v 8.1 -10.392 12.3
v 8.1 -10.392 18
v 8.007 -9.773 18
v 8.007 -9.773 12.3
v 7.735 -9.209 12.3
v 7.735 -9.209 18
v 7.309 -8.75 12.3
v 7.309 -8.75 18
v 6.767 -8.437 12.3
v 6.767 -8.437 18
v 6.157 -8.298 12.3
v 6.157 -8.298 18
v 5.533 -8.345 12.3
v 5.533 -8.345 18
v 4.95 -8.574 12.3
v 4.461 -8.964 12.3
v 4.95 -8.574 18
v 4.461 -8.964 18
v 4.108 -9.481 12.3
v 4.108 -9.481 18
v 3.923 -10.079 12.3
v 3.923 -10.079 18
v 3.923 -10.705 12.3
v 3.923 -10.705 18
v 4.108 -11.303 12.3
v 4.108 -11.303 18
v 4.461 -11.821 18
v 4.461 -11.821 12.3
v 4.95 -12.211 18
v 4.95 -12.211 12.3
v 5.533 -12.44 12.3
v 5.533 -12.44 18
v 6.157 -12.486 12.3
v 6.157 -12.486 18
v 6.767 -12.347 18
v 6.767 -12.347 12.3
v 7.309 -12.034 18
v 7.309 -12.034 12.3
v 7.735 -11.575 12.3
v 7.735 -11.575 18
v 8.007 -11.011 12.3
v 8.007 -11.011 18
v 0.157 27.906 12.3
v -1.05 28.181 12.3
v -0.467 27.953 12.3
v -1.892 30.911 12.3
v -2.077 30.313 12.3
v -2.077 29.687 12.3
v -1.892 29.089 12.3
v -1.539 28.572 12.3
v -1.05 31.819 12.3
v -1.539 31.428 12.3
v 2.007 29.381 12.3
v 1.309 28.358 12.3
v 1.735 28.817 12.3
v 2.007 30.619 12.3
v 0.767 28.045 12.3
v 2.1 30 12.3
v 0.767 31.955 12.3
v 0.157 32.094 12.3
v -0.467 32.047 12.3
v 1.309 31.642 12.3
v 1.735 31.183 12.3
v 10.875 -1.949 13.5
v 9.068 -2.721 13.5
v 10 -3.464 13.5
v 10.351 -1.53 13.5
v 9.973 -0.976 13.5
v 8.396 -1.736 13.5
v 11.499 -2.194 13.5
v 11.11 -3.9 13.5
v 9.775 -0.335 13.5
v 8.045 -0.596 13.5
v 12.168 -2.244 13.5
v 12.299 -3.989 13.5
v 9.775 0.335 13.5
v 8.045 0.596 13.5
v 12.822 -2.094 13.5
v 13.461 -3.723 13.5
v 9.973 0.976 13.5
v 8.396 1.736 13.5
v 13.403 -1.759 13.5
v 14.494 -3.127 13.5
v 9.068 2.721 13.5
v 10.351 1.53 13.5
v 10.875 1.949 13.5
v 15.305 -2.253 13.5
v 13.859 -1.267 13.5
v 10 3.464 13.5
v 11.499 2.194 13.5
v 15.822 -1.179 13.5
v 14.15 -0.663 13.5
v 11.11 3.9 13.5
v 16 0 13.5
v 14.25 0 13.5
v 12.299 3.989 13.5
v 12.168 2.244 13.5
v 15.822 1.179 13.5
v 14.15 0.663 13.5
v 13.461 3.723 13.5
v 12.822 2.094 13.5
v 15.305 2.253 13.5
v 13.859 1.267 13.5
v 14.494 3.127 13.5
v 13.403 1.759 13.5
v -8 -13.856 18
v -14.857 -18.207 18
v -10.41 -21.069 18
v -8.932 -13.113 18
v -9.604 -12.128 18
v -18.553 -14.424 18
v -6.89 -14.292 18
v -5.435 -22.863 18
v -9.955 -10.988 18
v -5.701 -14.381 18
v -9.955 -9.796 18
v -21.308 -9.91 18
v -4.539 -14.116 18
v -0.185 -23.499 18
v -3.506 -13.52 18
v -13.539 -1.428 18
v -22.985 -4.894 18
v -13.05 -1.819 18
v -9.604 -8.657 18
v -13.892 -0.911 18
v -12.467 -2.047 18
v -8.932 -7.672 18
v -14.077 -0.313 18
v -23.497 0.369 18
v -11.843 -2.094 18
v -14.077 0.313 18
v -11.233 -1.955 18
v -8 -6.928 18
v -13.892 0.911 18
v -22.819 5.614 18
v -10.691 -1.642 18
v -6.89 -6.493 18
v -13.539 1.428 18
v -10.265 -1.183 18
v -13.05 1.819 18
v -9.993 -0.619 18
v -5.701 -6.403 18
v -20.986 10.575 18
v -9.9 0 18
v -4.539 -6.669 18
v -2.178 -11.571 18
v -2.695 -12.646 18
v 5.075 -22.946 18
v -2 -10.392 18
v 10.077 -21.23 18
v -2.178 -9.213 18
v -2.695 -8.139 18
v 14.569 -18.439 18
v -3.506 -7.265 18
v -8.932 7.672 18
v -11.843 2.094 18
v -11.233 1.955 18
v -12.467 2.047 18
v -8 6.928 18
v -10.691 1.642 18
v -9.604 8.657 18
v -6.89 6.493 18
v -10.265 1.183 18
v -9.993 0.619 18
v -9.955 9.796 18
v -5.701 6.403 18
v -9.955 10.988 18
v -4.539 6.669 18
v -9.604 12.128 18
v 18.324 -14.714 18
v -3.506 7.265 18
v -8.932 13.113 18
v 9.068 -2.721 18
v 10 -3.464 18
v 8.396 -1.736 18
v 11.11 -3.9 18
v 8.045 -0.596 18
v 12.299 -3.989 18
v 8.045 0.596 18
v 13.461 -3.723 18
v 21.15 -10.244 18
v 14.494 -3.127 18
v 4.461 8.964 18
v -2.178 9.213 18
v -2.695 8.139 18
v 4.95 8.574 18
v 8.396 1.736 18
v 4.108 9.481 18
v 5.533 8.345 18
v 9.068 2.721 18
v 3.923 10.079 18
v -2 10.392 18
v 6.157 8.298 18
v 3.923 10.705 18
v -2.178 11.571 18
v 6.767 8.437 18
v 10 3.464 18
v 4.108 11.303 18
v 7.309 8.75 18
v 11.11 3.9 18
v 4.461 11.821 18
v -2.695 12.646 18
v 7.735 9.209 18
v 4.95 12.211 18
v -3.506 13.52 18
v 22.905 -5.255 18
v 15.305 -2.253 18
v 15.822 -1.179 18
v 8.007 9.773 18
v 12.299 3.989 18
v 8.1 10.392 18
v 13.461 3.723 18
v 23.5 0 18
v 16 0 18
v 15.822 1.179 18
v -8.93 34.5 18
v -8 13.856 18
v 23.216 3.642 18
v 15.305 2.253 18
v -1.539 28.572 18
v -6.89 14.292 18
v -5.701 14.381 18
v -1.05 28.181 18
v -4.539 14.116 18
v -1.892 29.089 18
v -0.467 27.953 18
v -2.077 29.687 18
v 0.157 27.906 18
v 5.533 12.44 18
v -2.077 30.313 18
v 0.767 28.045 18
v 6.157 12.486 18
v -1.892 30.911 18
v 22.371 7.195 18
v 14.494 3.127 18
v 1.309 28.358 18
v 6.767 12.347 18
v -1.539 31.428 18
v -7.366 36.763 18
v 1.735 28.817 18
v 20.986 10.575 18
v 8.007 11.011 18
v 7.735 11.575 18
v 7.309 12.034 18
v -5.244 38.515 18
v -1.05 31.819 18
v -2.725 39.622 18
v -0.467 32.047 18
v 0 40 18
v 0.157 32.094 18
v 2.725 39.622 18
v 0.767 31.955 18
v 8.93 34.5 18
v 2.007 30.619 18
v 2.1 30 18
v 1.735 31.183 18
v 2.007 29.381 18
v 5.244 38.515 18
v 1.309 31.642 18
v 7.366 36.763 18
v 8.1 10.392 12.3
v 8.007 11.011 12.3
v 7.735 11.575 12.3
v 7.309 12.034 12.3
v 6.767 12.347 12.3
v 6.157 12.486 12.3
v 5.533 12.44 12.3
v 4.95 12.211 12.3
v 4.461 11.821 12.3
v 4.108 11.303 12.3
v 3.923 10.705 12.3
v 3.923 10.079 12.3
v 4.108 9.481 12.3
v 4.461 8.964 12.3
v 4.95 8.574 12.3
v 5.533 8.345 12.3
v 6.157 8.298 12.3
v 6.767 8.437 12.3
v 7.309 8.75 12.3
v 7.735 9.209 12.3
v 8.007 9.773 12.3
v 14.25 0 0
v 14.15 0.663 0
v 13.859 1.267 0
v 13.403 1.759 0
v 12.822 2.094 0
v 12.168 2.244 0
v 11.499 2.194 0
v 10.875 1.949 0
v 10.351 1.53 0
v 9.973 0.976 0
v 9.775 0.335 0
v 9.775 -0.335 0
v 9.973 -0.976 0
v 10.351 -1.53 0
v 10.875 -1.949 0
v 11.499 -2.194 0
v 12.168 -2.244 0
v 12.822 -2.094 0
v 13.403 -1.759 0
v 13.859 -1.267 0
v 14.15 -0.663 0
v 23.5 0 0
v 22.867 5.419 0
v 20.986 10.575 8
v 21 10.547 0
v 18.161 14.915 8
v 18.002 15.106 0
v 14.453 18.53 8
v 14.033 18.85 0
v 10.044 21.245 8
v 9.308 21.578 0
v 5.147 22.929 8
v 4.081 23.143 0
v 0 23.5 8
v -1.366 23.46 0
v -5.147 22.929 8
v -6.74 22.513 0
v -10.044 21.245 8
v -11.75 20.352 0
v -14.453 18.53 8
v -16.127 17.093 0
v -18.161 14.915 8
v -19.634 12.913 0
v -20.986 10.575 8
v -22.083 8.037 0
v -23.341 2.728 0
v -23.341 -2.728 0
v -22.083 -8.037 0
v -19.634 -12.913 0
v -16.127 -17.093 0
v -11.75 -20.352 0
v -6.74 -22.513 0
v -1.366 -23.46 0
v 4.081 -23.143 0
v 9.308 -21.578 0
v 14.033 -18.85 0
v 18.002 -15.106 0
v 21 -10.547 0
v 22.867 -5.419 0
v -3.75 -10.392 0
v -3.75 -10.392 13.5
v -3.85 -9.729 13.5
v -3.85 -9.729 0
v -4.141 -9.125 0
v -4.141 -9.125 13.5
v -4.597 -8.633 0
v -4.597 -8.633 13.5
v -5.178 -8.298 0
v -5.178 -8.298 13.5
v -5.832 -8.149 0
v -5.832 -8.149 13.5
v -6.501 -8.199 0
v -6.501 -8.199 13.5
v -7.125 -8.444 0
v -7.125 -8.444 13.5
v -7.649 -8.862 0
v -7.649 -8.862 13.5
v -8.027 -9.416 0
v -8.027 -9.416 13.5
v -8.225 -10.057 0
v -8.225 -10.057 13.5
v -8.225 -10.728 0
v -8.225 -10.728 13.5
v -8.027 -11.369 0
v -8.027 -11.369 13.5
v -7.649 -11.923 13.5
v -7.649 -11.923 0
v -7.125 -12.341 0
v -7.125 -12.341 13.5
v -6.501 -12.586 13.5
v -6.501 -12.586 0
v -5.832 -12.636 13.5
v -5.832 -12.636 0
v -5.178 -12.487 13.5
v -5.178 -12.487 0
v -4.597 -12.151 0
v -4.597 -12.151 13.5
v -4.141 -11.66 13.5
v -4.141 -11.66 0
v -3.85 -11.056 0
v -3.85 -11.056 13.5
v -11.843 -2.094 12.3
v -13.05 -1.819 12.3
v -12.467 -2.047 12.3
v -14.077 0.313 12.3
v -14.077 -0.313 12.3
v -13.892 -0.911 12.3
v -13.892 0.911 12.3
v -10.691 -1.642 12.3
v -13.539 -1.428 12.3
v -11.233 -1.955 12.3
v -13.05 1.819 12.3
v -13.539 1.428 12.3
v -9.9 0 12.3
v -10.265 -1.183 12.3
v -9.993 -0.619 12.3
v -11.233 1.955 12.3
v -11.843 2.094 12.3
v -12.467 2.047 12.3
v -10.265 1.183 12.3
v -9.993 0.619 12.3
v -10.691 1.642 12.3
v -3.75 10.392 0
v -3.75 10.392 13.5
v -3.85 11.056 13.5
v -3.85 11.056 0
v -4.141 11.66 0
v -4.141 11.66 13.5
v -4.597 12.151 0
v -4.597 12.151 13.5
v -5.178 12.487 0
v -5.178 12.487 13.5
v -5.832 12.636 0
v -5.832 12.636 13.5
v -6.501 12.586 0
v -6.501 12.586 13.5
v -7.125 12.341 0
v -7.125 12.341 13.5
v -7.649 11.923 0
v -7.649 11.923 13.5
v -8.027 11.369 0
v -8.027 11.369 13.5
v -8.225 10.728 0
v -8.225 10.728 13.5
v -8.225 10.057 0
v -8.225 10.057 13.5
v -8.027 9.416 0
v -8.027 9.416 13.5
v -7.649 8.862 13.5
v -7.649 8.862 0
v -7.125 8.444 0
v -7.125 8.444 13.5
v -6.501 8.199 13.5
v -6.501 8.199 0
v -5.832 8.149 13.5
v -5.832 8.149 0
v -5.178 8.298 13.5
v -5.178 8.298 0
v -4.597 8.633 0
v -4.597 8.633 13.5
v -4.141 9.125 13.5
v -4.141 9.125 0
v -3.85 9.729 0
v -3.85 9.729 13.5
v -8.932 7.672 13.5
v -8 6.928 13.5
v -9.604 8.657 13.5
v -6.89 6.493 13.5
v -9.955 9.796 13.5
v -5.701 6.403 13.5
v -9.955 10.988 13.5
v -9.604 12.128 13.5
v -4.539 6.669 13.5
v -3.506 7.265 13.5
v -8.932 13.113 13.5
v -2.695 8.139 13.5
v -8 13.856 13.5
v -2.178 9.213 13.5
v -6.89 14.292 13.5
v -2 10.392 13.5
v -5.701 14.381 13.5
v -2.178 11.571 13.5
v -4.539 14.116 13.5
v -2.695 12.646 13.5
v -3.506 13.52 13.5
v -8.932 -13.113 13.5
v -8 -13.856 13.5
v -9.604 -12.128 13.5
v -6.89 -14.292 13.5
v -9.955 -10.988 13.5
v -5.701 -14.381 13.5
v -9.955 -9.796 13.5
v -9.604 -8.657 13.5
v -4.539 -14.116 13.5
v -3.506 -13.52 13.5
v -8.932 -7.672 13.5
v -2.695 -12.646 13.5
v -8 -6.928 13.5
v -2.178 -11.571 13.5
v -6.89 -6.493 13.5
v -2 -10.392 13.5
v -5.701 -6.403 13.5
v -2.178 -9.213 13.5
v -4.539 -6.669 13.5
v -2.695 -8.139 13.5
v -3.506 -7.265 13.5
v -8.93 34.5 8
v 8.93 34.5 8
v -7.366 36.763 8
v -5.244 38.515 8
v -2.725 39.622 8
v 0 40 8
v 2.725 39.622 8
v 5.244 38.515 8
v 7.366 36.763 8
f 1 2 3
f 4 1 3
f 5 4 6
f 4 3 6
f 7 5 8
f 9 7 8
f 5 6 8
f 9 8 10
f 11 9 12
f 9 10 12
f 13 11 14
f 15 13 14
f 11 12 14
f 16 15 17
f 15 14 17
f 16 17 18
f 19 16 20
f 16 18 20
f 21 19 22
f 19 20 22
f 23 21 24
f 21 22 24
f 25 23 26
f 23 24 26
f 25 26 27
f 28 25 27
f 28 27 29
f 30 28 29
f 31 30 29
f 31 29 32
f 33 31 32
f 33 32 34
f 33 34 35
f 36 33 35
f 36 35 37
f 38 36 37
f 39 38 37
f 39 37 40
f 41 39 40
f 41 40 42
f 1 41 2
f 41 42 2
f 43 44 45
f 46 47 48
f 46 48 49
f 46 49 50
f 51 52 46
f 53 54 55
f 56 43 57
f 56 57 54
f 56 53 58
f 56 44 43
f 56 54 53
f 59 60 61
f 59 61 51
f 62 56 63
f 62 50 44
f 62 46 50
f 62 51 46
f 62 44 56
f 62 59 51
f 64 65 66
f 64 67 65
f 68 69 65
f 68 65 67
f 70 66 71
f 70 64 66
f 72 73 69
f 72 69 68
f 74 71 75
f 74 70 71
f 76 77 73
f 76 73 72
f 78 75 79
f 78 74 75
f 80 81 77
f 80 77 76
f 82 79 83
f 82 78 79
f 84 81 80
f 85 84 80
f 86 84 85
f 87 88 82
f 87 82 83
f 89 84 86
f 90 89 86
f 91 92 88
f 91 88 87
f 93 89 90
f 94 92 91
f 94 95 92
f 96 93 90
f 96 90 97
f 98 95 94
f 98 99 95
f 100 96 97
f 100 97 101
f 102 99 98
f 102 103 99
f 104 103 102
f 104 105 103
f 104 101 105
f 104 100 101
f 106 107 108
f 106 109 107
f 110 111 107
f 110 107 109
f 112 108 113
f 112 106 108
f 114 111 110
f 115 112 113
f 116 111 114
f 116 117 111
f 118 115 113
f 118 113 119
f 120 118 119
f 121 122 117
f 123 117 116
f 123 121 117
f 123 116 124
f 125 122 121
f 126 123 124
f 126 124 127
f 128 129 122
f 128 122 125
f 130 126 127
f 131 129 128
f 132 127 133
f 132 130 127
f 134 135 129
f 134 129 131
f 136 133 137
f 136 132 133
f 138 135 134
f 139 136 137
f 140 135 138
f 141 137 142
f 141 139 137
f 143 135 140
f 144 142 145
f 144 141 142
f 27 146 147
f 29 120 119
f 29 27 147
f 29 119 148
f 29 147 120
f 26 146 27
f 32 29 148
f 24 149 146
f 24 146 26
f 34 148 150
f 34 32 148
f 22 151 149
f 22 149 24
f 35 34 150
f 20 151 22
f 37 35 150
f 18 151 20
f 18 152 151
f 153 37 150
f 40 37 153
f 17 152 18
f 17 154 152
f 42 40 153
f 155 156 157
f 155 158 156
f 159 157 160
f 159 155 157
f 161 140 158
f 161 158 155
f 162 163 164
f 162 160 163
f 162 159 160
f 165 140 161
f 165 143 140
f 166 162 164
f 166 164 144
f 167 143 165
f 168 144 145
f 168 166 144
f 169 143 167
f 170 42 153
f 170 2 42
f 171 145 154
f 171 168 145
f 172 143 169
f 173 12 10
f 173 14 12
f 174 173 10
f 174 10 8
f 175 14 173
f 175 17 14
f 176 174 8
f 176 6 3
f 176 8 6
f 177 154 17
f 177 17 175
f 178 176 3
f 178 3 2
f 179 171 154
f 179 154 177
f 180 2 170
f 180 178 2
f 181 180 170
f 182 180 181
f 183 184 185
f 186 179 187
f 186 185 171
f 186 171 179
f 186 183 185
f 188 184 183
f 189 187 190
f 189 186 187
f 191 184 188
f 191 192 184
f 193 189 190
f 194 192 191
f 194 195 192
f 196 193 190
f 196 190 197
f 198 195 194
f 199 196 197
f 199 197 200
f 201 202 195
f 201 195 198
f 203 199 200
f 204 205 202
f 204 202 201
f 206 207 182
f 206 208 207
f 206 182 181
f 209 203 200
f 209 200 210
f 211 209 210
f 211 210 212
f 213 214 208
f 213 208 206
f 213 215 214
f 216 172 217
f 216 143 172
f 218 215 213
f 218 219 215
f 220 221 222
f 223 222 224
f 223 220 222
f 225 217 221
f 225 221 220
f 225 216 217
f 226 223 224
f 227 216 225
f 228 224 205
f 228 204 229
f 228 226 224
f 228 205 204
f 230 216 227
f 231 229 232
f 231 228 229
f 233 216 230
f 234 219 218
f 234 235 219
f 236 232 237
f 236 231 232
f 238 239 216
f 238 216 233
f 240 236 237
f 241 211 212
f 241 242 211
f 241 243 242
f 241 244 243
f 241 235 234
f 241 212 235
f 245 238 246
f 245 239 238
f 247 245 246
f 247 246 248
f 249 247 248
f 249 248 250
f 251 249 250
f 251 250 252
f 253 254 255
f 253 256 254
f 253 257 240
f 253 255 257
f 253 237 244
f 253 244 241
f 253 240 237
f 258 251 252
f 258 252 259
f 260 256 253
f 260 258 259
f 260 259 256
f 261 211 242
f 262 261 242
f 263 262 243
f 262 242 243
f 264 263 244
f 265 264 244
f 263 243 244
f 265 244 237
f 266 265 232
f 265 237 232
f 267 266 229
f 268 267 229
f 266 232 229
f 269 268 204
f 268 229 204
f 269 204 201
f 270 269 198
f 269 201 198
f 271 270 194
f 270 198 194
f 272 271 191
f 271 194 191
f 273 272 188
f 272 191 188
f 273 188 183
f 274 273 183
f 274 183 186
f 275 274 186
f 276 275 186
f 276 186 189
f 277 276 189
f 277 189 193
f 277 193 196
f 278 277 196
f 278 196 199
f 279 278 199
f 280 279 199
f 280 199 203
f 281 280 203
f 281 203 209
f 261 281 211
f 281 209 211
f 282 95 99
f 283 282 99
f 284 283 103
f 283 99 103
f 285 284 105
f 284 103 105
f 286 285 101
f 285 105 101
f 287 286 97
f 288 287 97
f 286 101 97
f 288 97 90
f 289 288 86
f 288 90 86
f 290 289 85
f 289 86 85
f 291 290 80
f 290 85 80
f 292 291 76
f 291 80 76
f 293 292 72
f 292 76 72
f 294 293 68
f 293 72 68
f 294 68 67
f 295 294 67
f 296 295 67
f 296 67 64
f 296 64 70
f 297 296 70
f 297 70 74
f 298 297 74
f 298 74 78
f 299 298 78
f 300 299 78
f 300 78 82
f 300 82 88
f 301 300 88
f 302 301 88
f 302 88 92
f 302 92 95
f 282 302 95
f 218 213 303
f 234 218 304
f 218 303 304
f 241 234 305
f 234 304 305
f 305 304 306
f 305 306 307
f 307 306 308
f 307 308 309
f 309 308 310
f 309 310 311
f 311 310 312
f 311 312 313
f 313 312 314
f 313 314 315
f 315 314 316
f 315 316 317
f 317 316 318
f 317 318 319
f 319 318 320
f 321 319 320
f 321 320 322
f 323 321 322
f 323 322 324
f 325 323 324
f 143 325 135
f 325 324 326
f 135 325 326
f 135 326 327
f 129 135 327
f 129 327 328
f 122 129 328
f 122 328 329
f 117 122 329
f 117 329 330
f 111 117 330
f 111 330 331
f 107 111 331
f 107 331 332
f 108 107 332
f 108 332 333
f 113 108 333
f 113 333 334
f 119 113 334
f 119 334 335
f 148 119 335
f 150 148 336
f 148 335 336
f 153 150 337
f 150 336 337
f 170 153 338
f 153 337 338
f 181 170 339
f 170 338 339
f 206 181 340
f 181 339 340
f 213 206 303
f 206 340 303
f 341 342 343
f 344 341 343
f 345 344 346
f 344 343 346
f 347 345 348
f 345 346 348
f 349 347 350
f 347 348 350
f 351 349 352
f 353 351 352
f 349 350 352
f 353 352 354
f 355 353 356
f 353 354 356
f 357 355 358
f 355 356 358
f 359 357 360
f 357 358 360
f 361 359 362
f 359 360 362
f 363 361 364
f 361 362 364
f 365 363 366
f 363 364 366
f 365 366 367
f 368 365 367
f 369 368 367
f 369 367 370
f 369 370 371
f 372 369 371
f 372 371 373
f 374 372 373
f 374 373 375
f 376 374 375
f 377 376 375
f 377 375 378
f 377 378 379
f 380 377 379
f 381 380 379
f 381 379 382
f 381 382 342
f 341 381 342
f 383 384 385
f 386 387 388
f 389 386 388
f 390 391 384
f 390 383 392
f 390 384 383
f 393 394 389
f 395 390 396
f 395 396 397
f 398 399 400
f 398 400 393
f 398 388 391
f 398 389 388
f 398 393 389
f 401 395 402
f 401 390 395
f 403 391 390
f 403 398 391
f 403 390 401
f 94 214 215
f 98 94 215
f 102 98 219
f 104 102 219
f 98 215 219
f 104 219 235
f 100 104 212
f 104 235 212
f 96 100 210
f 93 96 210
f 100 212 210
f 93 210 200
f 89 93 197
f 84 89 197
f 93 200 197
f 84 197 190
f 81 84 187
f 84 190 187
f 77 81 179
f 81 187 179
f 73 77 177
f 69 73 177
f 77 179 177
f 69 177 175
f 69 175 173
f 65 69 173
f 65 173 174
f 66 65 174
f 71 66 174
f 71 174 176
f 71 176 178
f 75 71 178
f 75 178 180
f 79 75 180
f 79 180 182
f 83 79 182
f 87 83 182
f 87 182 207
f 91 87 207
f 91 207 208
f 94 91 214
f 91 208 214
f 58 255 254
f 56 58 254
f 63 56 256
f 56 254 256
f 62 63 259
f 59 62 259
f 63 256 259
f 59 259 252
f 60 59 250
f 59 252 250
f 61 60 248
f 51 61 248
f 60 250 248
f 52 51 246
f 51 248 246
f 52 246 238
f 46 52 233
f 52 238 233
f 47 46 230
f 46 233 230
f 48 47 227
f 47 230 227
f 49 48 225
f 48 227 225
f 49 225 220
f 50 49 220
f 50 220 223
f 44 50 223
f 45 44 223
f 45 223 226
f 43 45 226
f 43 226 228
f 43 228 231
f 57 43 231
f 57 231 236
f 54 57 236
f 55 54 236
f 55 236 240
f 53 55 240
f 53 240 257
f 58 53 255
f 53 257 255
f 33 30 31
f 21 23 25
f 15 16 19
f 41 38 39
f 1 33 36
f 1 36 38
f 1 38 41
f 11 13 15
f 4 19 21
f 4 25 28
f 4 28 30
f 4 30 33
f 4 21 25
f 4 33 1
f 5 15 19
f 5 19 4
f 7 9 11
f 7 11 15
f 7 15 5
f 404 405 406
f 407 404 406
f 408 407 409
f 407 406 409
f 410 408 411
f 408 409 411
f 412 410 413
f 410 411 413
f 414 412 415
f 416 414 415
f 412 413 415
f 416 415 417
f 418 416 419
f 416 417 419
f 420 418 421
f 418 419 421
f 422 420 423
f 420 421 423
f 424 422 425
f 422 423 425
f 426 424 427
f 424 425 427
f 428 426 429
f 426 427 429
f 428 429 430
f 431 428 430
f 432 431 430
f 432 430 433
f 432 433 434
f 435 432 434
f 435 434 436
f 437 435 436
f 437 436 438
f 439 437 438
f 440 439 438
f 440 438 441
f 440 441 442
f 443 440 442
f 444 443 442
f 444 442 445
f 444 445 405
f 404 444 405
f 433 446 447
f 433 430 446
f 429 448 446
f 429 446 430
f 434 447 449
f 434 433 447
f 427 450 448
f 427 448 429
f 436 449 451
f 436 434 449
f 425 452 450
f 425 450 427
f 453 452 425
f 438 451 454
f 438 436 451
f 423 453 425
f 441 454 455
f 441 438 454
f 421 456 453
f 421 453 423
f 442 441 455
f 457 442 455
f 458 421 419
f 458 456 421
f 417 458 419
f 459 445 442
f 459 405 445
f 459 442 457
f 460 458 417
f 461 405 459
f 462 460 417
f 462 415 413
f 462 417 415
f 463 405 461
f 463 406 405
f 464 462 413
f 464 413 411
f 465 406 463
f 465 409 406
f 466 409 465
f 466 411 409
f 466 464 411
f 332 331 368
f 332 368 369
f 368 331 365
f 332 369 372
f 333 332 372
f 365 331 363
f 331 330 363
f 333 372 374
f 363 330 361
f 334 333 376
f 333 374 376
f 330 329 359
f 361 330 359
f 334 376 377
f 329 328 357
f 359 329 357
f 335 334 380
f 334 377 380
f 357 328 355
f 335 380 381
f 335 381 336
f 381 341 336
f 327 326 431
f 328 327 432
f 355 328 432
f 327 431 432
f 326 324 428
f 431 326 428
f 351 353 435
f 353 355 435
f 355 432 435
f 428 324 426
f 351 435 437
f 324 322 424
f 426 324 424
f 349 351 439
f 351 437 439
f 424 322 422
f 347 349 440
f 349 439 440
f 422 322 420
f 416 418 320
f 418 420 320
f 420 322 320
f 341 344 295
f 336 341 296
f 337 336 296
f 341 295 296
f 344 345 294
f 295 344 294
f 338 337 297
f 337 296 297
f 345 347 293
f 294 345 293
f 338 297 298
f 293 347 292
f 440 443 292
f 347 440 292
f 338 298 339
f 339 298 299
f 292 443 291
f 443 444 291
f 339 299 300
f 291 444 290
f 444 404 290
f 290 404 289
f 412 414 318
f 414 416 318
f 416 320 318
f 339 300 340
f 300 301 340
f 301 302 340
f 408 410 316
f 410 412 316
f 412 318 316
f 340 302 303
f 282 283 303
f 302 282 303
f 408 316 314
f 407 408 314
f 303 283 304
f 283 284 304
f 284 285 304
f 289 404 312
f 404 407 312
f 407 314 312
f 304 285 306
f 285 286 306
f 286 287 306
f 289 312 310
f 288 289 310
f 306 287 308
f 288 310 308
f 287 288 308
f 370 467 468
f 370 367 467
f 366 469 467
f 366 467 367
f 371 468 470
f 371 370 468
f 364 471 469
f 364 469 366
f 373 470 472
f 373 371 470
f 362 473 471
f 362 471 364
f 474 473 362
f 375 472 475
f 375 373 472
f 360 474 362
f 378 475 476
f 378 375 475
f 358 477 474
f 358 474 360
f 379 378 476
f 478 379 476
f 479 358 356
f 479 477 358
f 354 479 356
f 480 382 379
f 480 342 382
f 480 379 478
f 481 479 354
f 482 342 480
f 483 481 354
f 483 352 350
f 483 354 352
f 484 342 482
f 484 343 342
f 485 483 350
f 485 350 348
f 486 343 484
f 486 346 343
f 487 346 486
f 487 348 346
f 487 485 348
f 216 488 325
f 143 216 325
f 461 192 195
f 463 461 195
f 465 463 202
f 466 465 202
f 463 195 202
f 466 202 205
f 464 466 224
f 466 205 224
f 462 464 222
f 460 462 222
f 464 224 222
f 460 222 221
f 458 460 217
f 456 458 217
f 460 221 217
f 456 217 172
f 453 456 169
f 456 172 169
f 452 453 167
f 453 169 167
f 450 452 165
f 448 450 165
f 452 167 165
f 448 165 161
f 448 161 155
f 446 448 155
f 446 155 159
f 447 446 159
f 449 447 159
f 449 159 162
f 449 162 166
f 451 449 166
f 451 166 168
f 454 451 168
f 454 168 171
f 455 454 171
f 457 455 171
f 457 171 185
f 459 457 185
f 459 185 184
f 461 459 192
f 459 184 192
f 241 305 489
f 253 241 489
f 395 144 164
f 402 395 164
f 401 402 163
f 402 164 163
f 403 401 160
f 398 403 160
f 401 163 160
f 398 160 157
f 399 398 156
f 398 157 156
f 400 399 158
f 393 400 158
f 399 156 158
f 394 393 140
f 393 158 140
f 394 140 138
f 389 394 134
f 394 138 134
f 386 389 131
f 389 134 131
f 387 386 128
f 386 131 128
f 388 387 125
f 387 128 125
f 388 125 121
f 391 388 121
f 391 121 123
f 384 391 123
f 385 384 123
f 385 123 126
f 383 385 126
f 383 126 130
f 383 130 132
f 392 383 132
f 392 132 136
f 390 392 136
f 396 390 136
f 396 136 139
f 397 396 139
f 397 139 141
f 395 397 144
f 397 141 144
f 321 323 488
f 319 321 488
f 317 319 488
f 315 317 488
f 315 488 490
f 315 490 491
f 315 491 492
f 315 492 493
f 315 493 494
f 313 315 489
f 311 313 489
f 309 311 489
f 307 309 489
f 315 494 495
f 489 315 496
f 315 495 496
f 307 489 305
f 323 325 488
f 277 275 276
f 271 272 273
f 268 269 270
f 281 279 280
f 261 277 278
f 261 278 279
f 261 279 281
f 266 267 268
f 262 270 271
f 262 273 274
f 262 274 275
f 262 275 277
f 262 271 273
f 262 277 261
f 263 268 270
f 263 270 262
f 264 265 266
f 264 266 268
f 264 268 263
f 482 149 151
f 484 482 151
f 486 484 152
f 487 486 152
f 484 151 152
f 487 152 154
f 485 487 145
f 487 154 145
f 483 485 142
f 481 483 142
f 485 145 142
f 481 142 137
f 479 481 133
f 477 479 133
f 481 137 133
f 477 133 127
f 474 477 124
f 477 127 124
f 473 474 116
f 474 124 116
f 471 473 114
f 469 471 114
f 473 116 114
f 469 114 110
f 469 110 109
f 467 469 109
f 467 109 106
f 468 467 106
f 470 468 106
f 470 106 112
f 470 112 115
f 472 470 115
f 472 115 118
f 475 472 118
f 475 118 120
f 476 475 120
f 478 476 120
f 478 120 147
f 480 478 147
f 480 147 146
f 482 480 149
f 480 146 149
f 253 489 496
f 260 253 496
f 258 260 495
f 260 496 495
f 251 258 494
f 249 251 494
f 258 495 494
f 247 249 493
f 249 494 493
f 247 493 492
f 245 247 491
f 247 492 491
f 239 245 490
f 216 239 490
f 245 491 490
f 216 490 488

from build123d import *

# Parameters (mm, degrees)
SKETCH1_R           = 23.5
BOSS_EXTRUDE1_DEPTH = 18
BOSS_EXTRUDE2_START = -10
BOSS_EXTRUDE2_DEPTH = 10
SKETCH8_R           = 2.25
CUT_EXTRUDE3_DEPTH  = 50.761933242
SKETCH9_R           = 4
CUT_EXTRUDE4_DEPTH  = 4.5
SKETCH10_R          = 2.1
CUT_EXTRUDE5_DEPTH  = 5.7


with BuildPart() as part:
    # Sketch1 → Boss-Extrude1 (new body)
    with BuildSketch(Plane.XY):
        Circle(SKETCH1_R)
    extrude(amount=BOSS_EXTRUDE1_DEPTH)

    # Sketch7 → Boss-Extrude2 (add)
    with BuildSketch(Plane.XY.offset(18).offset(BOSS_EXTRUDE2_START)):
        with BuildLine():
            ThreePointArc((0, 23.5), (12.323503966, 20.00952898), (20.986171042, 10.575))
            Line((20.986171042, 10.575), (8.93028555, 34.5))
            ThreePointArc((8.93028555, 34.5), (0, 40), (-8.93028555, 34.5))
            Line((-8.93028555, 34.5), (-20.986171042, 10.575))
            ThreePointArc((-20.986171042, 10.575), (-12.323503966, 20.00952898), (0, 23.5))
        make_face()
    extrude(amount=BOSS_EXTRUDE2_DEPTH)

    # Sketch8 → Cut-Extrude3 (cut, through all)
    with BuildSketch(Plane.XY.offset(18)):
        with Locations((12, 0)):
            Circle(SKETCH8_R)
        with Locations((-6, -10.392304845)):
            Circle(SKETCH8_R)
        with Locations((-6, 10.392304845)):
            Circle(SKETCH8_R)
    extrude(amount=-CUT_EXTRUDE3_DEPTH, mode=Mode.SUBTRACT)

    # Sketch9 → Cut-Extrude4 (cut)
    with BuildSketch(Plane.XY.offset(18)):
        with Locations((-6, 10.392304845)):
            Circle(SKETCH9_R)
        with Locations((12, 0)):
            Circle(SKETCH9_R)
        with Locations((-6, -10.392304845)):
            Circle(SKETCH9_R)
    extrude(amount=-CUT_EXTRUDE4_DEPTH, mode=Mode.SUBTRACT)

    # Sketch10 → Cut-Extrude5 (cut)
    with BuildSketch(Plane.XY.offset(18)):
        with Locations((0, 30)):
            Circle(SKETCH10_R)
        with Locations((12, 0)):
            Circle(SKETCH10_R)
        with Locations((6, -10.392304845)):
            Circle(SKETCH10_R)
        with Locations((-6, -10.392304845)):
            Circle(SKETCH10_R)
        with Locations((-12, 0)):
            Circle(SKETCH10_R)
        with Locations((-6, 10.392304845)):
            Circle(SKETCH10_R)
        with Locations((6, 10.392304845)):
            Circle(SKETCH10_R)
    extrude(amount=-CUT_EXTRUDE5_DEPTH, mode=Mode.SUBTRACT)


solid = part.part
